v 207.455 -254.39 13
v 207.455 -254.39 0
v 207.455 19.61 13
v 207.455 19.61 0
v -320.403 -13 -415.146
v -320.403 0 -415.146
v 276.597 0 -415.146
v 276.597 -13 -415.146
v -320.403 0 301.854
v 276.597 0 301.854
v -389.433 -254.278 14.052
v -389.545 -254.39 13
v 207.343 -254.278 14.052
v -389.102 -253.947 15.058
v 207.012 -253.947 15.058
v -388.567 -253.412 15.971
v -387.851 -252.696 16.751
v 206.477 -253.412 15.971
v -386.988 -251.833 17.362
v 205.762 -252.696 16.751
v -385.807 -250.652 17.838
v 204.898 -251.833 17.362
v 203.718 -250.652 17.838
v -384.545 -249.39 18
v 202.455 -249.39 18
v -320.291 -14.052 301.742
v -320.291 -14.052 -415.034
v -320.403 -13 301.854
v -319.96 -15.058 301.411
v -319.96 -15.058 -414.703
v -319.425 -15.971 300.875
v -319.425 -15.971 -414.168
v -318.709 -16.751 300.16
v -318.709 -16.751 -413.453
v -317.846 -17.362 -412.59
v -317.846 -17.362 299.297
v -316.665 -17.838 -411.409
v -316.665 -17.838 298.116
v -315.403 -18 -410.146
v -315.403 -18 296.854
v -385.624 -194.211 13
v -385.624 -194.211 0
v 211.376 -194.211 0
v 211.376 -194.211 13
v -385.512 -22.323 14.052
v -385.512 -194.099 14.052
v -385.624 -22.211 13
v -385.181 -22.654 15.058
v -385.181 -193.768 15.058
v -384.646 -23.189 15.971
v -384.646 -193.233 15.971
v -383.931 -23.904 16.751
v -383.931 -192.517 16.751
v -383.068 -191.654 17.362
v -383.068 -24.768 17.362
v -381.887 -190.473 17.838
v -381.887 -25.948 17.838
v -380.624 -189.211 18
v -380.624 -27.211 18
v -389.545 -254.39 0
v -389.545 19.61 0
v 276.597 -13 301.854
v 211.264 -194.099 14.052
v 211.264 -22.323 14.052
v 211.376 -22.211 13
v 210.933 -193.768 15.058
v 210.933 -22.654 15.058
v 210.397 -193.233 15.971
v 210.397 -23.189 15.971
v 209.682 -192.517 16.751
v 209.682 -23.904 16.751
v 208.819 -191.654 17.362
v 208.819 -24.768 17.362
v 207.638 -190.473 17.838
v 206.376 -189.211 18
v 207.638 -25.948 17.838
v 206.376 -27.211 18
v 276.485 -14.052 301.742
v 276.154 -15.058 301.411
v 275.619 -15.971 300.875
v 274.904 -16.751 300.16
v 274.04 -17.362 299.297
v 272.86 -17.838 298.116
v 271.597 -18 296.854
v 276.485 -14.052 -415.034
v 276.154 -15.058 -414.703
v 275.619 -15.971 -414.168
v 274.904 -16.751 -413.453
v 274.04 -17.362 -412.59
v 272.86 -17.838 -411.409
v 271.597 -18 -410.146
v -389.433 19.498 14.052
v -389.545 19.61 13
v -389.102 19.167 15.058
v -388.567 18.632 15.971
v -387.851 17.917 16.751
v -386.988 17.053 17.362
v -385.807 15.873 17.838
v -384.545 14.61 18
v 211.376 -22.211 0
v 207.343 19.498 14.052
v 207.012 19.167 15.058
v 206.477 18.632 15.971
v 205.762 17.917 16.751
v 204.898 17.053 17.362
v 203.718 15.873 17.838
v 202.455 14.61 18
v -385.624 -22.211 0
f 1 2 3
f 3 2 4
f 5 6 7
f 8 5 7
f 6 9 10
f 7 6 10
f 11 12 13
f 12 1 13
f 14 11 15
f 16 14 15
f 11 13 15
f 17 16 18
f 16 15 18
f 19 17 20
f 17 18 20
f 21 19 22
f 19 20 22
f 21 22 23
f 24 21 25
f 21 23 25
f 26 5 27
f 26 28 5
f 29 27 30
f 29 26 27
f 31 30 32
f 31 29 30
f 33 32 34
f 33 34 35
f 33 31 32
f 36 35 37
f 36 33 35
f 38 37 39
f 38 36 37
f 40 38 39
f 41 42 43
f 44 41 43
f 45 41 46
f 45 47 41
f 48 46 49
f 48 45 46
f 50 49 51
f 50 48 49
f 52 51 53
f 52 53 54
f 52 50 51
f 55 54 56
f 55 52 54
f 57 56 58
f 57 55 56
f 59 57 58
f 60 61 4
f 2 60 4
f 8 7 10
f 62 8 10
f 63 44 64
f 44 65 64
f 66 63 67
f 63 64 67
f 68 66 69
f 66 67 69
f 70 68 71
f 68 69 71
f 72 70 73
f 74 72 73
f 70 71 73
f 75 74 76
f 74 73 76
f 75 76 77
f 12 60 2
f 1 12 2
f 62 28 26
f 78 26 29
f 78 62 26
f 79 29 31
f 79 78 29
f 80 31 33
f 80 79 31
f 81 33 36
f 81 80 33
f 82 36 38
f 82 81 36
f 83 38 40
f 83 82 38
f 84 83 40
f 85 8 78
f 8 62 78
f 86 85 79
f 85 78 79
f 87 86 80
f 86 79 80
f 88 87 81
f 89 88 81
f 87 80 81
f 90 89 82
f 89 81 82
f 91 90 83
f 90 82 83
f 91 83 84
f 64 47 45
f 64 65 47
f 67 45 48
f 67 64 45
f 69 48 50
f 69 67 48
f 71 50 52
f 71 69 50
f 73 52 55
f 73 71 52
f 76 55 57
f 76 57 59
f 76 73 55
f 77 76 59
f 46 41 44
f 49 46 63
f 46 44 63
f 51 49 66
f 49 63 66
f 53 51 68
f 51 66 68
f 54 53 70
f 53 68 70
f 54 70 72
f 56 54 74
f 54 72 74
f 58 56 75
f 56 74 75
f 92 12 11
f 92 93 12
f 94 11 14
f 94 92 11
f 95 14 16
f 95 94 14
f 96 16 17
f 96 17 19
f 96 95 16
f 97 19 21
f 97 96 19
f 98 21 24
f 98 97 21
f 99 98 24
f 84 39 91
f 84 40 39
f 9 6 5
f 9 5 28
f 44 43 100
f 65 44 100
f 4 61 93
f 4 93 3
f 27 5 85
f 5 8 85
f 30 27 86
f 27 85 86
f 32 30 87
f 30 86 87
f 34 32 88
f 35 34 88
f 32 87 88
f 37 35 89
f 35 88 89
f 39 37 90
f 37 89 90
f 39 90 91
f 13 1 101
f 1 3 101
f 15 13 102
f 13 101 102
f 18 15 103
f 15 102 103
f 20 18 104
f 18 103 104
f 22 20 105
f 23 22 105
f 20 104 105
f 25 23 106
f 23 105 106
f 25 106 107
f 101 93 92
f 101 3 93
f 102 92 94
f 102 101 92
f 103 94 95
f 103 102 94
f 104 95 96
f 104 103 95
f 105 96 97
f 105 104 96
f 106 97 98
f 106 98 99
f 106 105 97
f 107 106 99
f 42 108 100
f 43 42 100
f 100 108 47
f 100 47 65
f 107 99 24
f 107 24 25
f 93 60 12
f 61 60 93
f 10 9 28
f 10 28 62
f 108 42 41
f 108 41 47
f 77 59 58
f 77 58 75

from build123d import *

# Parameters (mm, degrees)
F0_W      = 597
F0_H      = 717
F1_DEPTH  = 18
F2_R      = 5
F4_W      = 587
F4_H      = 172
F5_DEPTH  = 17
F7_W      = 597
F7_H      = 172
F8_DEPTH  = 18
F9_R      = 5
F10_W     = 597
F10_H     = 274
F11_DEPTH = 18
F12_R     = 5


with BuildPart() as f1:
    # F0 (on Front) → F1 (new body)
    with BuildSketch(Plane.XZ):
        with Locations((-21.90291, -56.646419)):
            Rectangle(F0_W, F0_H)
    extrude(amount=F1_DEPTH)

    # F2
    f2_edges = [f1.edges().sort_by_distance(p)[0] for p in [
        (-21.90291, -18, -415.146419),
        (276.59709, -18, -56.646419),
        (-21.90291, -18, 301.853581),
        (-320.40291, -18, -56.646419),
    ]]
    fillet(f2_edges, radius=F2_R)


with BuildPart() as f3_1:
    # F3: copy of F1
    add(f1.part.moved(Location((700, 0, 0))))

    # F4 (on face) → F5 (join)
    with BuildSketch(Plane.XZ.offset(18)):
        with Locations((678.09709, 210.853581)):
            Rectangle(F4_W, F4_H)
    extrude(amount=-F5_DEPTH)


with BuildPart() as f8:
    # F7 (on Top) → F8 (new body)
    with BuildSketch(Plane.XY):
        with Locations((-87.12443, -108.21071)):
            Rectangle(F7_W, F7_H)
    extrude(amount=F8_DEPTH)

    # F9
    f9_edges = [f8.edges().sort_by_distance(p)[0] for p in [
        (-87.12443, -22.21071, 18),
        (-385.62443, -108.21071, 18),
        (-87.12443, -194.21071, 18),
        (211.37557, -108.21071, 18),
    ]]
    fillet(f9_edges, radius=F9_R)


with BuildPart() as f11:
    # F10 (on Top) → F11 (new body)
    with BuildSketch(Plane.XY):
        with Locations((-91.044821, -117.389939)):
            Rectangle(F10_W, F10_H)
    extrude(amount=F11_DEPTH)

    # F12
    f12_edges = [f11.edges().sort_by_distance(p)[0] for p in [
        (-91.044821, 19.610061, 18),
        (-389.544821, -117.389939, 18),
        (-91.044821, -254.389939, 18),
        (207.455179, -117.389939, 18),
    ]]
    fillet(f12_edges, radius=F12_R)


solid = Compound([f1.part, f8.part, f11.part])
